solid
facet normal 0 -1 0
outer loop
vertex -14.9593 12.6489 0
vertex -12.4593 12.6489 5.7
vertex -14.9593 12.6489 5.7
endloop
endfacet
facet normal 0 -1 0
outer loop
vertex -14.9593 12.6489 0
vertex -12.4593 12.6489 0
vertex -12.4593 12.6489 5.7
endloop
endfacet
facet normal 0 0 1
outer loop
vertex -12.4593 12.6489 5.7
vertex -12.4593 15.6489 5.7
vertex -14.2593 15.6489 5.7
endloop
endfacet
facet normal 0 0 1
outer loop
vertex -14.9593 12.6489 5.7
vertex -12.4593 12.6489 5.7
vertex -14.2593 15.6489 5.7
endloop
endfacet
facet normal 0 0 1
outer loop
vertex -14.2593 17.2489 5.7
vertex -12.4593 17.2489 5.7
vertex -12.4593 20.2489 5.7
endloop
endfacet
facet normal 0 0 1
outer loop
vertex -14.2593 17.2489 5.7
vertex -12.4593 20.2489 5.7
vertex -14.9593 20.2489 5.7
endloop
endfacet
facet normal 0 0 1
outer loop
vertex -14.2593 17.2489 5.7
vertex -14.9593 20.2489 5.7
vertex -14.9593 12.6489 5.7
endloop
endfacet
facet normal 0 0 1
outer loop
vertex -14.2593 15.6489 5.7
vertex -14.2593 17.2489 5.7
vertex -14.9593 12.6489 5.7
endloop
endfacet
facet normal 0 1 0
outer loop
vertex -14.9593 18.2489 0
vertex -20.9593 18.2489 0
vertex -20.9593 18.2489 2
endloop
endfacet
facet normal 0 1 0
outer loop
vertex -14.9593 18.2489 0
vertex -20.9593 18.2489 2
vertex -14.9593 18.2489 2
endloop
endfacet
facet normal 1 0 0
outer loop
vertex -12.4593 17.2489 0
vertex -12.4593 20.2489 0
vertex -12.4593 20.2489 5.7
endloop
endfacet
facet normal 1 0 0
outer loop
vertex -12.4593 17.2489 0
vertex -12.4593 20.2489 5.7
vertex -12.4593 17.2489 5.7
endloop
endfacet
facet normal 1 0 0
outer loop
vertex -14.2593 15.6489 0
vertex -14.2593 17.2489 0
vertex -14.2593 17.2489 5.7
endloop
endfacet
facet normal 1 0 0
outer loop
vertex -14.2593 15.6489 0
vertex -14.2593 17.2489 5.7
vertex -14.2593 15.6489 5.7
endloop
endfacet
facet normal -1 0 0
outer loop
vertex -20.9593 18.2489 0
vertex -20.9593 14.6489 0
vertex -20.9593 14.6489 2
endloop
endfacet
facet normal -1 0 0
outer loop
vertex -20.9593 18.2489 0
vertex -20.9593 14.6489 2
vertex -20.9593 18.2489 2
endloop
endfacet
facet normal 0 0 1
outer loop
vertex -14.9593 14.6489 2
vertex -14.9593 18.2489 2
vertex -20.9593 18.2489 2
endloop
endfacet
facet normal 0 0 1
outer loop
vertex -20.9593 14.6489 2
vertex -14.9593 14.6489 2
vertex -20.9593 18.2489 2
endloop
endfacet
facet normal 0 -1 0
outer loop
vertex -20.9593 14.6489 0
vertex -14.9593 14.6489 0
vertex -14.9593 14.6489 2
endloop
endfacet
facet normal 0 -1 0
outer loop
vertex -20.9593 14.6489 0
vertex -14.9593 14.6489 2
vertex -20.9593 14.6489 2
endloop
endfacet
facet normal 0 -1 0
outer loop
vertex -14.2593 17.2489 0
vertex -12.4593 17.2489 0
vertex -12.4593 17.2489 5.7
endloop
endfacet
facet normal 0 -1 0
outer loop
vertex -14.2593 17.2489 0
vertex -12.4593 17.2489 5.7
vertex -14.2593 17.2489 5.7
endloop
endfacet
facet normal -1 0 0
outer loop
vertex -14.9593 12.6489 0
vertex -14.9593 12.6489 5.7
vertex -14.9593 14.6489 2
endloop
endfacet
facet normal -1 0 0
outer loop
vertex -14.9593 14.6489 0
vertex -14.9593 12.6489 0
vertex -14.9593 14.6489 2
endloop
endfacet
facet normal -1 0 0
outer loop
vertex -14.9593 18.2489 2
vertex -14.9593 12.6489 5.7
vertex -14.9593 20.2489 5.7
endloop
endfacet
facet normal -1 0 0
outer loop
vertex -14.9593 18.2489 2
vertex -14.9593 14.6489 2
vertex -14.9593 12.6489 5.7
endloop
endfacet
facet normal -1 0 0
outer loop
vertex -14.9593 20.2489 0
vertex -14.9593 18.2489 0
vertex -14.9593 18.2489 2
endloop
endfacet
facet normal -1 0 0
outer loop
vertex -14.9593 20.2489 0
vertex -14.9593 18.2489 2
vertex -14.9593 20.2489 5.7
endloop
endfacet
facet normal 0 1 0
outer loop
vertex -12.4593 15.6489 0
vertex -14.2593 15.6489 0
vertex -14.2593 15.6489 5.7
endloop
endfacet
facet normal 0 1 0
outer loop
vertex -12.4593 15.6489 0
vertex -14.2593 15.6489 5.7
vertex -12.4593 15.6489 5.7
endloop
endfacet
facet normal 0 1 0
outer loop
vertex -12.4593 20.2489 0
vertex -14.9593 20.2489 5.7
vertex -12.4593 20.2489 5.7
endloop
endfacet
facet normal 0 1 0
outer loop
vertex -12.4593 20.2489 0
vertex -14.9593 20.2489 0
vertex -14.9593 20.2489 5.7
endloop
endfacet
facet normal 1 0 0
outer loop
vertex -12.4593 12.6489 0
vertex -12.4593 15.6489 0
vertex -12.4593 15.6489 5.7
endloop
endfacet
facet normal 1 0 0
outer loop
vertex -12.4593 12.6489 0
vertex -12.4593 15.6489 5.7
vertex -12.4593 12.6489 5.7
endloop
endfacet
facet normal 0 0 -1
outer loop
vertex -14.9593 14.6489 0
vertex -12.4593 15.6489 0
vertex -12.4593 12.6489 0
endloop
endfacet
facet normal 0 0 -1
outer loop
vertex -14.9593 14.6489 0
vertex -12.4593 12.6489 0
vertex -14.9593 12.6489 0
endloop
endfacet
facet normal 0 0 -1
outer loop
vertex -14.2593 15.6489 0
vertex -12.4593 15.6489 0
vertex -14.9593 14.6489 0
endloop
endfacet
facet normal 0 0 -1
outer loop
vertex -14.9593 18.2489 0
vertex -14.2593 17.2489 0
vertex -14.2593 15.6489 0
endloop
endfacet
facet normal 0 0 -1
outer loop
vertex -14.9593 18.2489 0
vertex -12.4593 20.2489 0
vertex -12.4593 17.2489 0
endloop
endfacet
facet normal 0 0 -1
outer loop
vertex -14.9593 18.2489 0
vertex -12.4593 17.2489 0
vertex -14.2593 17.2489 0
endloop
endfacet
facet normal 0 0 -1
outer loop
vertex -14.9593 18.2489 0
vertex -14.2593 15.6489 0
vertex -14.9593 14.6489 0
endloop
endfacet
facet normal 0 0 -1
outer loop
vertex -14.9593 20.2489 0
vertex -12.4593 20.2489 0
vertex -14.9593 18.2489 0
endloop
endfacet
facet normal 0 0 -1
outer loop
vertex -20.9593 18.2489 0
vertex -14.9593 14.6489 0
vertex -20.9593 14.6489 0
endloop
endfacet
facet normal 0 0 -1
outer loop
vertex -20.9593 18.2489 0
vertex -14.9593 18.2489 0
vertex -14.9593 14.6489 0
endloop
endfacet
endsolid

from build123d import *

# Parameters (mm, degrees)
BOSS_EXTRUDE1_DEPTH = 2
BOSS_EXTRUDE2_DEPTH = 3.7


with BuildPart() as part:
    # Sketch1 → Boss-Extrude1 (new body)
    with BuildSketch(Plane.XY):
        Polygon((-14.259347555, 17.248938456), (-14.259347555, 15.648938456), (-12.459347555, 15.648938456), (-12.459347555, 12.648938456), (-14.959347555, 12.648938456), (-14.959347555, 14.648938456), (-20.959347555, 14.648938456), (-20.959347555, 18.248938456), (-14.959347555, 18.248938456), (-14.959347555, 20.248938456), (-12.459347555, 20.248938456), (-12.459347555, 17.248938456), align=None)
    extrude(amount=BOSS_EXTRUDE1_DEPTH)

    # Sketch2 → Boss-Extrude2 (add)
    with BuildSketch(Plane.XY.offset(2)):
        Polygon((-14.959347555, 20.248938456), (-12.459347555, 20.248938456), (-12.459347555, 17.248938456), (-14.259347555, 17.248938456), (-14.259347555, 15.648938456), (-12.459347555, 15.648938456), (-12.459347555, 12.648938456), (-14.959347555, 12.648938456), align=None)
    extrude(amount=BOSS_EXTRUDE2_DEPTH)


solid = part.part
